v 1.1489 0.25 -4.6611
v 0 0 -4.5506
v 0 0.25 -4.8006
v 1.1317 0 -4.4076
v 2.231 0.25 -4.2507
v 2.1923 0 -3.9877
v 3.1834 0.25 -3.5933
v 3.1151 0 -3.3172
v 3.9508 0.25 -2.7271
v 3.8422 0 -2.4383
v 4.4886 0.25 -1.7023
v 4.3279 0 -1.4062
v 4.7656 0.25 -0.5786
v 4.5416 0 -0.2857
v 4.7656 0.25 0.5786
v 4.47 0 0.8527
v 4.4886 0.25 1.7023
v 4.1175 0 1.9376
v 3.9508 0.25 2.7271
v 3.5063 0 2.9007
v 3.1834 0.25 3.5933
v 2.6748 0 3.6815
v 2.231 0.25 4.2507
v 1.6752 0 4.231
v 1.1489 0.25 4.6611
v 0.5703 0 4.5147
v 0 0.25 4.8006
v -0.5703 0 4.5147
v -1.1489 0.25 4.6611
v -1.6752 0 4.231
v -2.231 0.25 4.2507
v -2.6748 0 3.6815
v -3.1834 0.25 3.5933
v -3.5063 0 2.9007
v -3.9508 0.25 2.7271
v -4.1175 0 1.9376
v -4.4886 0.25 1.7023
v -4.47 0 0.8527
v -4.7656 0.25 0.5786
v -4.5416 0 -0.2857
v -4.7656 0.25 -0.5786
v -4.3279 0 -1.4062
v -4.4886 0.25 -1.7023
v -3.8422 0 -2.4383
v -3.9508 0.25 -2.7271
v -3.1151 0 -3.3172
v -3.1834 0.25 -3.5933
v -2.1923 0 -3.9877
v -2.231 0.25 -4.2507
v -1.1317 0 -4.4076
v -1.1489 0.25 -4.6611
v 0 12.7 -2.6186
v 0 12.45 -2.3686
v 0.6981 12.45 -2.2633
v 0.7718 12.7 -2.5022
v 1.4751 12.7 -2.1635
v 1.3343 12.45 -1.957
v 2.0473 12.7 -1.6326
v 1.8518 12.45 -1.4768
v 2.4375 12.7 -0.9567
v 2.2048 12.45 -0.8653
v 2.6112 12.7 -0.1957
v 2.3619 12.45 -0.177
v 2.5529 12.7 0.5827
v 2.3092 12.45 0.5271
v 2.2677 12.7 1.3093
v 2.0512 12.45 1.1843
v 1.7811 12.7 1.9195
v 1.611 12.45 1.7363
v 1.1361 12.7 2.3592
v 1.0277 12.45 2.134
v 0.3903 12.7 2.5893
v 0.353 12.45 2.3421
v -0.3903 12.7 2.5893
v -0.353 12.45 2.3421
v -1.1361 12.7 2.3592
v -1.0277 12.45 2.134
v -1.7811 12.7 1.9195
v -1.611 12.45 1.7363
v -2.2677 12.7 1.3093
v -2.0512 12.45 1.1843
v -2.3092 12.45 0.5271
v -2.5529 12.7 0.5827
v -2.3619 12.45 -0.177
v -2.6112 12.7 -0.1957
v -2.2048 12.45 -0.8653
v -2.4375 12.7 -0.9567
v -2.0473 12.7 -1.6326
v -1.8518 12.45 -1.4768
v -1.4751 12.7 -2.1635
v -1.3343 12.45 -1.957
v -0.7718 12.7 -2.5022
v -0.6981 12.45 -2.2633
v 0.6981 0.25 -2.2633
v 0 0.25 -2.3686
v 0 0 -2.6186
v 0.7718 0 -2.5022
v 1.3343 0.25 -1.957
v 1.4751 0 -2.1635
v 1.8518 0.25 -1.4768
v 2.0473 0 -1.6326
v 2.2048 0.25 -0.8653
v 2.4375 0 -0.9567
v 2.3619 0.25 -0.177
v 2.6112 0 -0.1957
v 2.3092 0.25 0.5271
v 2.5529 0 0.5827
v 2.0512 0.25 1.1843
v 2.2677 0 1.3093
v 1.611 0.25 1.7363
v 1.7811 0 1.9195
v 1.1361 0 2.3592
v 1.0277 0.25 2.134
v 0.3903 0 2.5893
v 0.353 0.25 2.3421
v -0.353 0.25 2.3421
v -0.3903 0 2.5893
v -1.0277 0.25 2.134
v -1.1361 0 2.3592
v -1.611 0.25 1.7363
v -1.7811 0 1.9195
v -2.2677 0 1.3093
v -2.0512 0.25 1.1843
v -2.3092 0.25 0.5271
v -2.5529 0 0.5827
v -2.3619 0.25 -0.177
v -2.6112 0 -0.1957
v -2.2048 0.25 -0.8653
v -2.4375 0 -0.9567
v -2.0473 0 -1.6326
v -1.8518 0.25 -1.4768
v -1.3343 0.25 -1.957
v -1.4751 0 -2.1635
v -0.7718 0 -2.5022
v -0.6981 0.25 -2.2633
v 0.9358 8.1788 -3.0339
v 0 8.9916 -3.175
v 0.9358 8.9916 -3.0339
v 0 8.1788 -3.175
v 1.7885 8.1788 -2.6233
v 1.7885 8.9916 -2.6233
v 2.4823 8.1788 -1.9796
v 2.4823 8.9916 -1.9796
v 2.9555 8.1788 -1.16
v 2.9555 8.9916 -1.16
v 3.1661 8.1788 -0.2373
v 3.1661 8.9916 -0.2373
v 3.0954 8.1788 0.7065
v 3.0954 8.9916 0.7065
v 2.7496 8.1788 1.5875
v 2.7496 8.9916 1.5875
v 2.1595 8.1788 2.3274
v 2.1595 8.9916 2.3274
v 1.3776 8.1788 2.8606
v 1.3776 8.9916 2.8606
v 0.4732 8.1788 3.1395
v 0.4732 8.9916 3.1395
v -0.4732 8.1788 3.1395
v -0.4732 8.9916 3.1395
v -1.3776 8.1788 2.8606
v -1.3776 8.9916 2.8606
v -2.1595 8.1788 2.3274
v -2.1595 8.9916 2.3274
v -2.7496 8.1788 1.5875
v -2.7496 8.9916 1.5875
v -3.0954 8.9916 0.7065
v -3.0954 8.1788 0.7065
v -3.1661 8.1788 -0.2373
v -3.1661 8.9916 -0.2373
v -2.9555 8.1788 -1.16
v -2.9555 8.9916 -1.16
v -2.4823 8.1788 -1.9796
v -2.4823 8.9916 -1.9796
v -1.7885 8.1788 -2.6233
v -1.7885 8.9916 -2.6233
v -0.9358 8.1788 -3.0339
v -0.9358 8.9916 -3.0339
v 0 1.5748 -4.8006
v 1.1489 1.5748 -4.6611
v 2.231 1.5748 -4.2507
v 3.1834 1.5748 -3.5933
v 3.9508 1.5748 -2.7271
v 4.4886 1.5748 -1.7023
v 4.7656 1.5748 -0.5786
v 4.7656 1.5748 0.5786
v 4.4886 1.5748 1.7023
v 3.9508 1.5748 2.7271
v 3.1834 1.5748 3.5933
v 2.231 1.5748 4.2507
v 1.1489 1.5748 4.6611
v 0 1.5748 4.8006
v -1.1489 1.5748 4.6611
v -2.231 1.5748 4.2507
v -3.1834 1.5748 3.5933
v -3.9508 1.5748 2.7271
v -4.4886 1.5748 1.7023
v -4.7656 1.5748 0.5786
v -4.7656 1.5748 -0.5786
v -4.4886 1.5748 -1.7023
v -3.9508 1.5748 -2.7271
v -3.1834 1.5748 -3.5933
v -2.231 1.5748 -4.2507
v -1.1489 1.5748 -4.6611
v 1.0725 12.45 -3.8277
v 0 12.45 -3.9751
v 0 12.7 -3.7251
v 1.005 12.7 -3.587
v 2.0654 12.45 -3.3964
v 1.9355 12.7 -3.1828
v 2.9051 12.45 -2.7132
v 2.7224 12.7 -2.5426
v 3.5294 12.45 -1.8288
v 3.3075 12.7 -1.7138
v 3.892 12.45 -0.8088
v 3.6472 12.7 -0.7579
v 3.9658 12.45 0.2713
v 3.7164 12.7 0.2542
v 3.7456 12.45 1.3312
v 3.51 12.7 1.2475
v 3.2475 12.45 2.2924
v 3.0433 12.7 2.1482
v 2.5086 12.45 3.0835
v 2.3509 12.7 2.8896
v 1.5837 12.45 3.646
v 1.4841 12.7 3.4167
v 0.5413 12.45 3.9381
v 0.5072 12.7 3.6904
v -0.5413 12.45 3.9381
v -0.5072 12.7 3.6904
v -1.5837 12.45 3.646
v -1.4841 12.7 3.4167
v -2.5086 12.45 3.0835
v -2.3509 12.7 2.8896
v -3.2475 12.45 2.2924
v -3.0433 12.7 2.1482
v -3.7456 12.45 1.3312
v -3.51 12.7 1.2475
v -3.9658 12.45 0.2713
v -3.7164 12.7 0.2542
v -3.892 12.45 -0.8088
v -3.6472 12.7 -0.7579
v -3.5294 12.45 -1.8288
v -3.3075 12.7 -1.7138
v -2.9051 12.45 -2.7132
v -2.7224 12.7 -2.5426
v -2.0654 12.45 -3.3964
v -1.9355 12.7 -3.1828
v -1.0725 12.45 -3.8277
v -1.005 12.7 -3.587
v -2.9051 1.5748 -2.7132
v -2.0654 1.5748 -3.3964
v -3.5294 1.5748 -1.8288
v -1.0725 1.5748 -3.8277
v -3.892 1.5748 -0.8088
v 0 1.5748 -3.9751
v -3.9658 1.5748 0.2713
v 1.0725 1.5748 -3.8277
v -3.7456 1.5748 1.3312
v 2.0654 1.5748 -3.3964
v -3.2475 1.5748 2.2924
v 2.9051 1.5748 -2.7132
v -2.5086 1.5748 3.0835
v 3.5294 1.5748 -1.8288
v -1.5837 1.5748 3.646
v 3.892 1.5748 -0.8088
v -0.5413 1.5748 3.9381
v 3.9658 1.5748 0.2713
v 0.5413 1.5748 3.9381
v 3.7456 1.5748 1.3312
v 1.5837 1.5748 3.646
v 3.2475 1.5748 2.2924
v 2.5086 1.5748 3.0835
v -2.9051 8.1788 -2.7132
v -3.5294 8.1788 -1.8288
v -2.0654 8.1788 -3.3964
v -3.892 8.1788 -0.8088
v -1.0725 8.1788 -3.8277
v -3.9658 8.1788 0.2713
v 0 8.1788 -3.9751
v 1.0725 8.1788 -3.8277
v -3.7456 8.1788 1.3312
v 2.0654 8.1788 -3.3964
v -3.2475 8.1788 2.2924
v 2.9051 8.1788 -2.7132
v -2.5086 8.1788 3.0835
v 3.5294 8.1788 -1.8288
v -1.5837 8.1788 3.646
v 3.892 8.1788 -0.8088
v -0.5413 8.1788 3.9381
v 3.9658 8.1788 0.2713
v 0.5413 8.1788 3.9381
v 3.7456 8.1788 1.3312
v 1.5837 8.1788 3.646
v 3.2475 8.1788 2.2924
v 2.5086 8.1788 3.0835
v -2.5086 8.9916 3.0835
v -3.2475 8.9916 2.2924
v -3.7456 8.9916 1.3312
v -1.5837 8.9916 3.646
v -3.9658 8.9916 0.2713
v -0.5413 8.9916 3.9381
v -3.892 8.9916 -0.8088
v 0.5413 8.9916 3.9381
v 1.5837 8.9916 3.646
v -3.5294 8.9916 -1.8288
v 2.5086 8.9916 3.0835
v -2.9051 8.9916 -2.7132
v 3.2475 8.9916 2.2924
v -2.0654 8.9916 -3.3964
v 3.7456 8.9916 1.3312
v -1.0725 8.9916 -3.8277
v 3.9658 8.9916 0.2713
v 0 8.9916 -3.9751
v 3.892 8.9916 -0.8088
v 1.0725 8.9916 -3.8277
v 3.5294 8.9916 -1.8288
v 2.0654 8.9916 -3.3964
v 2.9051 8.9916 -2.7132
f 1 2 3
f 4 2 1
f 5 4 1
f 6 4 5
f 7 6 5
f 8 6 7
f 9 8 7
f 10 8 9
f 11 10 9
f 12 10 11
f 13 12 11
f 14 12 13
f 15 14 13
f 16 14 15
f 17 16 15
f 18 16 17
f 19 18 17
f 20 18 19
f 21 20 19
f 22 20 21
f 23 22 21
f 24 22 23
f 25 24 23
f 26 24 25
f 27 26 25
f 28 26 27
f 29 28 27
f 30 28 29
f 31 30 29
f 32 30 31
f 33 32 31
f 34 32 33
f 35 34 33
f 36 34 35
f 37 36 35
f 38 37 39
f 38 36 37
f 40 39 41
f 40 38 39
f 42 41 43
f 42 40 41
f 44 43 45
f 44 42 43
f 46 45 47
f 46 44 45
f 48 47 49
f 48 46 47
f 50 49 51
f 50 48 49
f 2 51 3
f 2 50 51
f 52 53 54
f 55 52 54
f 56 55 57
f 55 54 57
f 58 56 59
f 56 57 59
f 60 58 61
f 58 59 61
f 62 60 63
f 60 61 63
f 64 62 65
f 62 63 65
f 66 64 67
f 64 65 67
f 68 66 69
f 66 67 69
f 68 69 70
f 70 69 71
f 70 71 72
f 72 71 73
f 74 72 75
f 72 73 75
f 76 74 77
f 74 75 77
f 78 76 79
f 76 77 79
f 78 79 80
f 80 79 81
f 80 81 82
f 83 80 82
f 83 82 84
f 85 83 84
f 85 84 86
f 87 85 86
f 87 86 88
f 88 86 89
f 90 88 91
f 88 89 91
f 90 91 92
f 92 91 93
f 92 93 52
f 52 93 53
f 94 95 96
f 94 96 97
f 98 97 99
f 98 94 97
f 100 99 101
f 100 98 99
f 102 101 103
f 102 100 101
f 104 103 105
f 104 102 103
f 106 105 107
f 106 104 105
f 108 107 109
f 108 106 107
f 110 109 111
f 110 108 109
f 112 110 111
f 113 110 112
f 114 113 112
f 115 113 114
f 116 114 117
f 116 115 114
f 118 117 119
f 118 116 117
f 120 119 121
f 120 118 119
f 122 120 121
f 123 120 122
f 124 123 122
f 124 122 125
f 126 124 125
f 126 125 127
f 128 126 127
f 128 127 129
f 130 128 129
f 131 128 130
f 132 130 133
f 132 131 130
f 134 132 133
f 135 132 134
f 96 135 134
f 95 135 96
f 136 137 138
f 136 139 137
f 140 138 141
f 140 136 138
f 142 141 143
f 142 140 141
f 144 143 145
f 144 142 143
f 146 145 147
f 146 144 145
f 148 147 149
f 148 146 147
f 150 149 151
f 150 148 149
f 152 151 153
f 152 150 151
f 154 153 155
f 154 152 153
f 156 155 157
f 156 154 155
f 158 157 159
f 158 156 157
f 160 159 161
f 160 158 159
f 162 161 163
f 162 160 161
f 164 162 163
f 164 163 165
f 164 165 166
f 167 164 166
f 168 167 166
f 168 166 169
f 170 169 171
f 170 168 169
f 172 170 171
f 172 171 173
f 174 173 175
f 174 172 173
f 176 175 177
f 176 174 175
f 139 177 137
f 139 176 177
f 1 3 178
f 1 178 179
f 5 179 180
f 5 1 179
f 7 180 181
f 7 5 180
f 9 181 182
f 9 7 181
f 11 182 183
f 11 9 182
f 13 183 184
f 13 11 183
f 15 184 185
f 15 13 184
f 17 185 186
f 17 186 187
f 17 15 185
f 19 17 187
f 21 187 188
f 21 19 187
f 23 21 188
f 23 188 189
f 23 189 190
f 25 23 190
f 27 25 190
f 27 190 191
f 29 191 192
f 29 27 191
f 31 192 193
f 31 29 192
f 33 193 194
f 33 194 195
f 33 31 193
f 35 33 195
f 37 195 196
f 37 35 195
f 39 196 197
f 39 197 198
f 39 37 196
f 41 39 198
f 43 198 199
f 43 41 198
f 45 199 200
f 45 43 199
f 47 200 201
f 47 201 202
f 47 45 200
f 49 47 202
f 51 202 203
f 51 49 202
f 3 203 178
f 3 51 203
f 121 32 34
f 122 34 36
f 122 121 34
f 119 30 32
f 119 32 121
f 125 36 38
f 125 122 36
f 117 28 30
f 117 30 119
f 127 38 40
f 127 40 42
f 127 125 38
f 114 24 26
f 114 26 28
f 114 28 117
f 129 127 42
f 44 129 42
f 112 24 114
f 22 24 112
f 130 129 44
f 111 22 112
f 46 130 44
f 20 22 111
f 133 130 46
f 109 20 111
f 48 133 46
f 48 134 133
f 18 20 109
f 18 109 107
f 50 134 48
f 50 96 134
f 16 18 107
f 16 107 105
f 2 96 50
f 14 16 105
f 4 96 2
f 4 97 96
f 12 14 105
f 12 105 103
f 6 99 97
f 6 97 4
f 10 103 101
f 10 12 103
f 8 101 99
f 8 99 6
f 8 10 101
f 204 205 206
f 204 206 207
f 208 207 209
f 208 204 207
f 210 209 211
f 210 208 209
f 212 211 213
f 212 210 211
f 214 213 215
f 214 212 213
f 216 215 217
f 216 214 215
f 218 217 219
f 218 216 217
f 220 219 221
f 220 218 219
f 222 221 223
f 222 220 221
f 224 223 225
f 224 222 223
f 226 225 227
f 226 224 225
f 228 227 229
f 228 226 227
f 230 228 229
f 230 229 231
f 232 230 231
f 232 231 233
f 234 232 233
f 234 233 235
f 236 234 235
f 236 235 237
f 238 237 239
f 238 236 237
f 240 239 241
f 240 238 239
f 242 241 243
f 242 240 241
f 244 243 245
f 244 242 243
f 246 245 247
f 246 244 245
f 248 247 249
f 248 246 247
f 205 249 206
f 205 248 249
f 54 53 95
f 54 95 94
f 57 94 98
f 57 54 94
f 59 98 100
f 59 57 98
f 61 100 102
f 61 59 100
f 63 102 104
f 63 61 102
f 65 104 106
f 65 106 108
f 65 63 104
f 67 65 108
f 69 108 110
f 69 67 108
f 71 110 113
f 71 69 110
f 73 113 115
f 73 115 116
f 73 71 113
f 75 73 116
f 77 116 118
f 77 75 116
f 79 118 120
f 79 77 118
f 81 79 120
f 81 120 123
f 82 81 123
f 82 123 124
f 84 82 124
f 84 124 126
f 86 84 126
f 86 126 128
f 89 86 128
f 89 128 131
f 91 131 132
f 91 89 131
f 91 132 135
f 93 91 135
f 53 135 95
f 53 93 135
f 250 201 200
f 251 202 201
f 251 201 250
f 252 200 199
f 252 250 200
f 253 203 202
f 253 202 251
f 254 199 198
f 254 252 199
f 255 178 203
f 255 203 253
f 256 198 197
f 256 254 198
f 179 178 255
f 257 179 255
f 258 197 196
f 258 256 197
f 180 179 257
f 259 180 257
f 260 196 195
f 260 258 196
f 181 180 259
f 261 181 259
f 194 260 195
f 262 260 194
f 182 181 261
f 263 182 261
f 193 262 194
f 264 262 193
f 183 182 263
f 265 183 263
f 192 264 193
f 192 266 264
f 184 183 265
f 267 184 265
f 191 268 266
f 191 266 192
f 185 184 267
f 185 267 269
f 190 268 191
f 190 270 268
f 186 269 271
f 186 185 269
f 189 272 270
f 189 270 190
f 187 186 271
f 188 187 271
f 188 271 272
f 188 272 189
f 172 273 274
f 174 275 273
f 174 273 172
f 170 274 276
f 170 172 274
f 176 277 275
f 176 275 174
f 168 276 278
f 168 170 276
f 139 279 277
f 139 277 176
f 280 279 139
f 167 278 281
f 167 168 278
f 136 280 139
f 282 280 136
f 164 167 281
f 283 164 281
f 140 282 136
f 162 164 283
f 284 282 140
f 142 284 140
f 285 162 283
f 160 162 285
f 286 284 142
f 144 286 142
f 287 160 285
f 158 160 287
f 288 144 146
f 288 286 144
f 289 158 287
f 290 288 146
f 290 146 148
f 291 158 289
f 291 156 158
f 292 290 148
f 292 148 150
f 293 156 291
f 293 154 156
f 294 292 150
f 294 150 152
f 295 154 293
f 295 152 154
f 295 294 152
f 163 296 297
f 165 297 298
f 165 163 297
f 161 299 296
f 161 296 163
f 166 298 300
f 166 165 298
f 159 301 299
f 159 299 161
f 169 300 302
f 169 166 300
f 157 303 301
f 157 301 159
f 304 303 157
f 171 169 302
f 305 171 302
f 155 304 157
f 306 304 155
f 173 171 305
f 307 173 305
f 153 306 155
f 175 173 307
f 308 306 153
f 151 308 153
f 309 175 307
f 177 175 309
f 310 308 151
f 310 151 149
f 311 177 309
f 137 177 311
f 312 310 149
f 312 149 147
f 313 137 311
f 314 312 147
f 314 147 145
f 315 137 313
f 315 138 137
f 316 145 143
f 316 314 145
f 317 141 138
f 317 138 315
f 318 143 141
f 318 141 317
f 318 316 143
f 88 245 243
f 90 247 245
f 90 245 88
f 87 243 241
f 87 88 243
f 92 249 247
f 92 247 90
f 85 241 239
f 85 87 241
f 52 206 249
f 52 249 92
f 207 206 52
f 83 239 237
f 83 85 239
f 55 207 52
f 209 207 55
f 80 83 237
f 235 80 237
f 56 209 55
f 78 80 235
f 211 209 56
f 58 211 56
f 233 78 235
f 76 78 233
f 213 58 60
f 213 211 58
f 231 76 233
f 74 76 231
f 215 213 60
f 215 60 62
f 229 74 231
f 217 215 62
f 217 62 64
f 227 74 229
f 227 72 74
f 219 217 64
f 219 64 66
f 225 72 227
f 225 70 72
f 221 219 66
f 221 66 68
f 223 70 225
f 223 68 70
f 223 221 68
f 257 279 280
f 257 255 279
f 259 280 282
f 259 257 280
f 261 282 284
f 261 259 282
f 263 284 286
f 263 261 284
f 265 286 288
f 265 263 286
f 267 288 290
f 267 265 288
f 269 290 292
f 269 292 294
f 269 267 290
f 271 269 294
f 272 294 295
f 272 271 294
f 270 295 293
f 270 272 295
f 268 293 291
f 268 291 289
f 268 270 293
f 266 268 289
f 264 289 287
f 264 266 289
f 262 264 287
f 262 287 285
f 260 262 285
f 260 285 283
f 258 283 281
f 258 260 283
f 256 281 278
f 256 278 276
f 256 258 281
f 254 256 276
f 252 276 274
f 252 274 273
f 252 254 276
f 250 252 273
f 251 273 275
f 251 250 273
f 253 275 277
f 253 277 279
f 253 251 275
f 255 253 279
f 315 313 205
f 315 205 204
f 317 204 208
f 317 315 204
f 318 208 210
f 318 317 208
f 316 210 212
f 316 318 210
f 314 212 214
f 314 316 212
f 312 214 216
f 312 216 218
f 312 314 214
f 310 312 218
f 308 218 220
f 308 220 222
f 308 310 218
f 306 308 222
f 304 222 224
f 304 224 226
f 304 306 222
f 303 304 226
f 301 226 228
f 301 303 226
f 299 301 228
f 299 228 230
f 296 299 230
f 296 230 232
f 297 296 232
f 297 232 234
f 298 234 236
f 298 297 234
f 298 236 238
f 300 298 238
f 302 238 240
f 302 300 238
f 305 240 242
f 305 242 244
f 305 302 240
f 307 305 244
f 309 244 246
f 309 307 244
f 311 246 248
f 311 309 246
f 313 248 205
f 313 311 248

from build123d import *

# Parameters (mm, degrees)
CHAMFER1_SIZE = 0.25


with BuildPart() as part:
    # Sketch2 → Revolve1 (revolve)
    with BuildSketch(Plane(origin=(0, 0, 0), x_dir=(0, 0, -1), z_dir=(1, 0, 0))):
        Polygon((2.36855, 12.7), (3.9751, 12.7), (3.9751, 8.9916), (3.175, 8.9916), (3.175, 8.1788), (3.9751, 8.1788), (3.9751, 1.5748), (4.8006, 1.5748), (4.8006, 0), (2.36855, 0), align=None)
    revolve(axis=Axis((0, -1.359924362, 0), (0, -1, 0)))

    # Chamfer1
    chamfer1_edges = [part.edges().sort_by_distance(p)[0] for p in [
        (0, 0, 4.8006),
        (0, 0, 2.36855),
        (0, 12.7, 2.36855),
        (0, 12.7, 3.9751),
    ]]
    chamfer(chamfer1_edges, length=CHAMFER1_SIZE)


solid = part.part
